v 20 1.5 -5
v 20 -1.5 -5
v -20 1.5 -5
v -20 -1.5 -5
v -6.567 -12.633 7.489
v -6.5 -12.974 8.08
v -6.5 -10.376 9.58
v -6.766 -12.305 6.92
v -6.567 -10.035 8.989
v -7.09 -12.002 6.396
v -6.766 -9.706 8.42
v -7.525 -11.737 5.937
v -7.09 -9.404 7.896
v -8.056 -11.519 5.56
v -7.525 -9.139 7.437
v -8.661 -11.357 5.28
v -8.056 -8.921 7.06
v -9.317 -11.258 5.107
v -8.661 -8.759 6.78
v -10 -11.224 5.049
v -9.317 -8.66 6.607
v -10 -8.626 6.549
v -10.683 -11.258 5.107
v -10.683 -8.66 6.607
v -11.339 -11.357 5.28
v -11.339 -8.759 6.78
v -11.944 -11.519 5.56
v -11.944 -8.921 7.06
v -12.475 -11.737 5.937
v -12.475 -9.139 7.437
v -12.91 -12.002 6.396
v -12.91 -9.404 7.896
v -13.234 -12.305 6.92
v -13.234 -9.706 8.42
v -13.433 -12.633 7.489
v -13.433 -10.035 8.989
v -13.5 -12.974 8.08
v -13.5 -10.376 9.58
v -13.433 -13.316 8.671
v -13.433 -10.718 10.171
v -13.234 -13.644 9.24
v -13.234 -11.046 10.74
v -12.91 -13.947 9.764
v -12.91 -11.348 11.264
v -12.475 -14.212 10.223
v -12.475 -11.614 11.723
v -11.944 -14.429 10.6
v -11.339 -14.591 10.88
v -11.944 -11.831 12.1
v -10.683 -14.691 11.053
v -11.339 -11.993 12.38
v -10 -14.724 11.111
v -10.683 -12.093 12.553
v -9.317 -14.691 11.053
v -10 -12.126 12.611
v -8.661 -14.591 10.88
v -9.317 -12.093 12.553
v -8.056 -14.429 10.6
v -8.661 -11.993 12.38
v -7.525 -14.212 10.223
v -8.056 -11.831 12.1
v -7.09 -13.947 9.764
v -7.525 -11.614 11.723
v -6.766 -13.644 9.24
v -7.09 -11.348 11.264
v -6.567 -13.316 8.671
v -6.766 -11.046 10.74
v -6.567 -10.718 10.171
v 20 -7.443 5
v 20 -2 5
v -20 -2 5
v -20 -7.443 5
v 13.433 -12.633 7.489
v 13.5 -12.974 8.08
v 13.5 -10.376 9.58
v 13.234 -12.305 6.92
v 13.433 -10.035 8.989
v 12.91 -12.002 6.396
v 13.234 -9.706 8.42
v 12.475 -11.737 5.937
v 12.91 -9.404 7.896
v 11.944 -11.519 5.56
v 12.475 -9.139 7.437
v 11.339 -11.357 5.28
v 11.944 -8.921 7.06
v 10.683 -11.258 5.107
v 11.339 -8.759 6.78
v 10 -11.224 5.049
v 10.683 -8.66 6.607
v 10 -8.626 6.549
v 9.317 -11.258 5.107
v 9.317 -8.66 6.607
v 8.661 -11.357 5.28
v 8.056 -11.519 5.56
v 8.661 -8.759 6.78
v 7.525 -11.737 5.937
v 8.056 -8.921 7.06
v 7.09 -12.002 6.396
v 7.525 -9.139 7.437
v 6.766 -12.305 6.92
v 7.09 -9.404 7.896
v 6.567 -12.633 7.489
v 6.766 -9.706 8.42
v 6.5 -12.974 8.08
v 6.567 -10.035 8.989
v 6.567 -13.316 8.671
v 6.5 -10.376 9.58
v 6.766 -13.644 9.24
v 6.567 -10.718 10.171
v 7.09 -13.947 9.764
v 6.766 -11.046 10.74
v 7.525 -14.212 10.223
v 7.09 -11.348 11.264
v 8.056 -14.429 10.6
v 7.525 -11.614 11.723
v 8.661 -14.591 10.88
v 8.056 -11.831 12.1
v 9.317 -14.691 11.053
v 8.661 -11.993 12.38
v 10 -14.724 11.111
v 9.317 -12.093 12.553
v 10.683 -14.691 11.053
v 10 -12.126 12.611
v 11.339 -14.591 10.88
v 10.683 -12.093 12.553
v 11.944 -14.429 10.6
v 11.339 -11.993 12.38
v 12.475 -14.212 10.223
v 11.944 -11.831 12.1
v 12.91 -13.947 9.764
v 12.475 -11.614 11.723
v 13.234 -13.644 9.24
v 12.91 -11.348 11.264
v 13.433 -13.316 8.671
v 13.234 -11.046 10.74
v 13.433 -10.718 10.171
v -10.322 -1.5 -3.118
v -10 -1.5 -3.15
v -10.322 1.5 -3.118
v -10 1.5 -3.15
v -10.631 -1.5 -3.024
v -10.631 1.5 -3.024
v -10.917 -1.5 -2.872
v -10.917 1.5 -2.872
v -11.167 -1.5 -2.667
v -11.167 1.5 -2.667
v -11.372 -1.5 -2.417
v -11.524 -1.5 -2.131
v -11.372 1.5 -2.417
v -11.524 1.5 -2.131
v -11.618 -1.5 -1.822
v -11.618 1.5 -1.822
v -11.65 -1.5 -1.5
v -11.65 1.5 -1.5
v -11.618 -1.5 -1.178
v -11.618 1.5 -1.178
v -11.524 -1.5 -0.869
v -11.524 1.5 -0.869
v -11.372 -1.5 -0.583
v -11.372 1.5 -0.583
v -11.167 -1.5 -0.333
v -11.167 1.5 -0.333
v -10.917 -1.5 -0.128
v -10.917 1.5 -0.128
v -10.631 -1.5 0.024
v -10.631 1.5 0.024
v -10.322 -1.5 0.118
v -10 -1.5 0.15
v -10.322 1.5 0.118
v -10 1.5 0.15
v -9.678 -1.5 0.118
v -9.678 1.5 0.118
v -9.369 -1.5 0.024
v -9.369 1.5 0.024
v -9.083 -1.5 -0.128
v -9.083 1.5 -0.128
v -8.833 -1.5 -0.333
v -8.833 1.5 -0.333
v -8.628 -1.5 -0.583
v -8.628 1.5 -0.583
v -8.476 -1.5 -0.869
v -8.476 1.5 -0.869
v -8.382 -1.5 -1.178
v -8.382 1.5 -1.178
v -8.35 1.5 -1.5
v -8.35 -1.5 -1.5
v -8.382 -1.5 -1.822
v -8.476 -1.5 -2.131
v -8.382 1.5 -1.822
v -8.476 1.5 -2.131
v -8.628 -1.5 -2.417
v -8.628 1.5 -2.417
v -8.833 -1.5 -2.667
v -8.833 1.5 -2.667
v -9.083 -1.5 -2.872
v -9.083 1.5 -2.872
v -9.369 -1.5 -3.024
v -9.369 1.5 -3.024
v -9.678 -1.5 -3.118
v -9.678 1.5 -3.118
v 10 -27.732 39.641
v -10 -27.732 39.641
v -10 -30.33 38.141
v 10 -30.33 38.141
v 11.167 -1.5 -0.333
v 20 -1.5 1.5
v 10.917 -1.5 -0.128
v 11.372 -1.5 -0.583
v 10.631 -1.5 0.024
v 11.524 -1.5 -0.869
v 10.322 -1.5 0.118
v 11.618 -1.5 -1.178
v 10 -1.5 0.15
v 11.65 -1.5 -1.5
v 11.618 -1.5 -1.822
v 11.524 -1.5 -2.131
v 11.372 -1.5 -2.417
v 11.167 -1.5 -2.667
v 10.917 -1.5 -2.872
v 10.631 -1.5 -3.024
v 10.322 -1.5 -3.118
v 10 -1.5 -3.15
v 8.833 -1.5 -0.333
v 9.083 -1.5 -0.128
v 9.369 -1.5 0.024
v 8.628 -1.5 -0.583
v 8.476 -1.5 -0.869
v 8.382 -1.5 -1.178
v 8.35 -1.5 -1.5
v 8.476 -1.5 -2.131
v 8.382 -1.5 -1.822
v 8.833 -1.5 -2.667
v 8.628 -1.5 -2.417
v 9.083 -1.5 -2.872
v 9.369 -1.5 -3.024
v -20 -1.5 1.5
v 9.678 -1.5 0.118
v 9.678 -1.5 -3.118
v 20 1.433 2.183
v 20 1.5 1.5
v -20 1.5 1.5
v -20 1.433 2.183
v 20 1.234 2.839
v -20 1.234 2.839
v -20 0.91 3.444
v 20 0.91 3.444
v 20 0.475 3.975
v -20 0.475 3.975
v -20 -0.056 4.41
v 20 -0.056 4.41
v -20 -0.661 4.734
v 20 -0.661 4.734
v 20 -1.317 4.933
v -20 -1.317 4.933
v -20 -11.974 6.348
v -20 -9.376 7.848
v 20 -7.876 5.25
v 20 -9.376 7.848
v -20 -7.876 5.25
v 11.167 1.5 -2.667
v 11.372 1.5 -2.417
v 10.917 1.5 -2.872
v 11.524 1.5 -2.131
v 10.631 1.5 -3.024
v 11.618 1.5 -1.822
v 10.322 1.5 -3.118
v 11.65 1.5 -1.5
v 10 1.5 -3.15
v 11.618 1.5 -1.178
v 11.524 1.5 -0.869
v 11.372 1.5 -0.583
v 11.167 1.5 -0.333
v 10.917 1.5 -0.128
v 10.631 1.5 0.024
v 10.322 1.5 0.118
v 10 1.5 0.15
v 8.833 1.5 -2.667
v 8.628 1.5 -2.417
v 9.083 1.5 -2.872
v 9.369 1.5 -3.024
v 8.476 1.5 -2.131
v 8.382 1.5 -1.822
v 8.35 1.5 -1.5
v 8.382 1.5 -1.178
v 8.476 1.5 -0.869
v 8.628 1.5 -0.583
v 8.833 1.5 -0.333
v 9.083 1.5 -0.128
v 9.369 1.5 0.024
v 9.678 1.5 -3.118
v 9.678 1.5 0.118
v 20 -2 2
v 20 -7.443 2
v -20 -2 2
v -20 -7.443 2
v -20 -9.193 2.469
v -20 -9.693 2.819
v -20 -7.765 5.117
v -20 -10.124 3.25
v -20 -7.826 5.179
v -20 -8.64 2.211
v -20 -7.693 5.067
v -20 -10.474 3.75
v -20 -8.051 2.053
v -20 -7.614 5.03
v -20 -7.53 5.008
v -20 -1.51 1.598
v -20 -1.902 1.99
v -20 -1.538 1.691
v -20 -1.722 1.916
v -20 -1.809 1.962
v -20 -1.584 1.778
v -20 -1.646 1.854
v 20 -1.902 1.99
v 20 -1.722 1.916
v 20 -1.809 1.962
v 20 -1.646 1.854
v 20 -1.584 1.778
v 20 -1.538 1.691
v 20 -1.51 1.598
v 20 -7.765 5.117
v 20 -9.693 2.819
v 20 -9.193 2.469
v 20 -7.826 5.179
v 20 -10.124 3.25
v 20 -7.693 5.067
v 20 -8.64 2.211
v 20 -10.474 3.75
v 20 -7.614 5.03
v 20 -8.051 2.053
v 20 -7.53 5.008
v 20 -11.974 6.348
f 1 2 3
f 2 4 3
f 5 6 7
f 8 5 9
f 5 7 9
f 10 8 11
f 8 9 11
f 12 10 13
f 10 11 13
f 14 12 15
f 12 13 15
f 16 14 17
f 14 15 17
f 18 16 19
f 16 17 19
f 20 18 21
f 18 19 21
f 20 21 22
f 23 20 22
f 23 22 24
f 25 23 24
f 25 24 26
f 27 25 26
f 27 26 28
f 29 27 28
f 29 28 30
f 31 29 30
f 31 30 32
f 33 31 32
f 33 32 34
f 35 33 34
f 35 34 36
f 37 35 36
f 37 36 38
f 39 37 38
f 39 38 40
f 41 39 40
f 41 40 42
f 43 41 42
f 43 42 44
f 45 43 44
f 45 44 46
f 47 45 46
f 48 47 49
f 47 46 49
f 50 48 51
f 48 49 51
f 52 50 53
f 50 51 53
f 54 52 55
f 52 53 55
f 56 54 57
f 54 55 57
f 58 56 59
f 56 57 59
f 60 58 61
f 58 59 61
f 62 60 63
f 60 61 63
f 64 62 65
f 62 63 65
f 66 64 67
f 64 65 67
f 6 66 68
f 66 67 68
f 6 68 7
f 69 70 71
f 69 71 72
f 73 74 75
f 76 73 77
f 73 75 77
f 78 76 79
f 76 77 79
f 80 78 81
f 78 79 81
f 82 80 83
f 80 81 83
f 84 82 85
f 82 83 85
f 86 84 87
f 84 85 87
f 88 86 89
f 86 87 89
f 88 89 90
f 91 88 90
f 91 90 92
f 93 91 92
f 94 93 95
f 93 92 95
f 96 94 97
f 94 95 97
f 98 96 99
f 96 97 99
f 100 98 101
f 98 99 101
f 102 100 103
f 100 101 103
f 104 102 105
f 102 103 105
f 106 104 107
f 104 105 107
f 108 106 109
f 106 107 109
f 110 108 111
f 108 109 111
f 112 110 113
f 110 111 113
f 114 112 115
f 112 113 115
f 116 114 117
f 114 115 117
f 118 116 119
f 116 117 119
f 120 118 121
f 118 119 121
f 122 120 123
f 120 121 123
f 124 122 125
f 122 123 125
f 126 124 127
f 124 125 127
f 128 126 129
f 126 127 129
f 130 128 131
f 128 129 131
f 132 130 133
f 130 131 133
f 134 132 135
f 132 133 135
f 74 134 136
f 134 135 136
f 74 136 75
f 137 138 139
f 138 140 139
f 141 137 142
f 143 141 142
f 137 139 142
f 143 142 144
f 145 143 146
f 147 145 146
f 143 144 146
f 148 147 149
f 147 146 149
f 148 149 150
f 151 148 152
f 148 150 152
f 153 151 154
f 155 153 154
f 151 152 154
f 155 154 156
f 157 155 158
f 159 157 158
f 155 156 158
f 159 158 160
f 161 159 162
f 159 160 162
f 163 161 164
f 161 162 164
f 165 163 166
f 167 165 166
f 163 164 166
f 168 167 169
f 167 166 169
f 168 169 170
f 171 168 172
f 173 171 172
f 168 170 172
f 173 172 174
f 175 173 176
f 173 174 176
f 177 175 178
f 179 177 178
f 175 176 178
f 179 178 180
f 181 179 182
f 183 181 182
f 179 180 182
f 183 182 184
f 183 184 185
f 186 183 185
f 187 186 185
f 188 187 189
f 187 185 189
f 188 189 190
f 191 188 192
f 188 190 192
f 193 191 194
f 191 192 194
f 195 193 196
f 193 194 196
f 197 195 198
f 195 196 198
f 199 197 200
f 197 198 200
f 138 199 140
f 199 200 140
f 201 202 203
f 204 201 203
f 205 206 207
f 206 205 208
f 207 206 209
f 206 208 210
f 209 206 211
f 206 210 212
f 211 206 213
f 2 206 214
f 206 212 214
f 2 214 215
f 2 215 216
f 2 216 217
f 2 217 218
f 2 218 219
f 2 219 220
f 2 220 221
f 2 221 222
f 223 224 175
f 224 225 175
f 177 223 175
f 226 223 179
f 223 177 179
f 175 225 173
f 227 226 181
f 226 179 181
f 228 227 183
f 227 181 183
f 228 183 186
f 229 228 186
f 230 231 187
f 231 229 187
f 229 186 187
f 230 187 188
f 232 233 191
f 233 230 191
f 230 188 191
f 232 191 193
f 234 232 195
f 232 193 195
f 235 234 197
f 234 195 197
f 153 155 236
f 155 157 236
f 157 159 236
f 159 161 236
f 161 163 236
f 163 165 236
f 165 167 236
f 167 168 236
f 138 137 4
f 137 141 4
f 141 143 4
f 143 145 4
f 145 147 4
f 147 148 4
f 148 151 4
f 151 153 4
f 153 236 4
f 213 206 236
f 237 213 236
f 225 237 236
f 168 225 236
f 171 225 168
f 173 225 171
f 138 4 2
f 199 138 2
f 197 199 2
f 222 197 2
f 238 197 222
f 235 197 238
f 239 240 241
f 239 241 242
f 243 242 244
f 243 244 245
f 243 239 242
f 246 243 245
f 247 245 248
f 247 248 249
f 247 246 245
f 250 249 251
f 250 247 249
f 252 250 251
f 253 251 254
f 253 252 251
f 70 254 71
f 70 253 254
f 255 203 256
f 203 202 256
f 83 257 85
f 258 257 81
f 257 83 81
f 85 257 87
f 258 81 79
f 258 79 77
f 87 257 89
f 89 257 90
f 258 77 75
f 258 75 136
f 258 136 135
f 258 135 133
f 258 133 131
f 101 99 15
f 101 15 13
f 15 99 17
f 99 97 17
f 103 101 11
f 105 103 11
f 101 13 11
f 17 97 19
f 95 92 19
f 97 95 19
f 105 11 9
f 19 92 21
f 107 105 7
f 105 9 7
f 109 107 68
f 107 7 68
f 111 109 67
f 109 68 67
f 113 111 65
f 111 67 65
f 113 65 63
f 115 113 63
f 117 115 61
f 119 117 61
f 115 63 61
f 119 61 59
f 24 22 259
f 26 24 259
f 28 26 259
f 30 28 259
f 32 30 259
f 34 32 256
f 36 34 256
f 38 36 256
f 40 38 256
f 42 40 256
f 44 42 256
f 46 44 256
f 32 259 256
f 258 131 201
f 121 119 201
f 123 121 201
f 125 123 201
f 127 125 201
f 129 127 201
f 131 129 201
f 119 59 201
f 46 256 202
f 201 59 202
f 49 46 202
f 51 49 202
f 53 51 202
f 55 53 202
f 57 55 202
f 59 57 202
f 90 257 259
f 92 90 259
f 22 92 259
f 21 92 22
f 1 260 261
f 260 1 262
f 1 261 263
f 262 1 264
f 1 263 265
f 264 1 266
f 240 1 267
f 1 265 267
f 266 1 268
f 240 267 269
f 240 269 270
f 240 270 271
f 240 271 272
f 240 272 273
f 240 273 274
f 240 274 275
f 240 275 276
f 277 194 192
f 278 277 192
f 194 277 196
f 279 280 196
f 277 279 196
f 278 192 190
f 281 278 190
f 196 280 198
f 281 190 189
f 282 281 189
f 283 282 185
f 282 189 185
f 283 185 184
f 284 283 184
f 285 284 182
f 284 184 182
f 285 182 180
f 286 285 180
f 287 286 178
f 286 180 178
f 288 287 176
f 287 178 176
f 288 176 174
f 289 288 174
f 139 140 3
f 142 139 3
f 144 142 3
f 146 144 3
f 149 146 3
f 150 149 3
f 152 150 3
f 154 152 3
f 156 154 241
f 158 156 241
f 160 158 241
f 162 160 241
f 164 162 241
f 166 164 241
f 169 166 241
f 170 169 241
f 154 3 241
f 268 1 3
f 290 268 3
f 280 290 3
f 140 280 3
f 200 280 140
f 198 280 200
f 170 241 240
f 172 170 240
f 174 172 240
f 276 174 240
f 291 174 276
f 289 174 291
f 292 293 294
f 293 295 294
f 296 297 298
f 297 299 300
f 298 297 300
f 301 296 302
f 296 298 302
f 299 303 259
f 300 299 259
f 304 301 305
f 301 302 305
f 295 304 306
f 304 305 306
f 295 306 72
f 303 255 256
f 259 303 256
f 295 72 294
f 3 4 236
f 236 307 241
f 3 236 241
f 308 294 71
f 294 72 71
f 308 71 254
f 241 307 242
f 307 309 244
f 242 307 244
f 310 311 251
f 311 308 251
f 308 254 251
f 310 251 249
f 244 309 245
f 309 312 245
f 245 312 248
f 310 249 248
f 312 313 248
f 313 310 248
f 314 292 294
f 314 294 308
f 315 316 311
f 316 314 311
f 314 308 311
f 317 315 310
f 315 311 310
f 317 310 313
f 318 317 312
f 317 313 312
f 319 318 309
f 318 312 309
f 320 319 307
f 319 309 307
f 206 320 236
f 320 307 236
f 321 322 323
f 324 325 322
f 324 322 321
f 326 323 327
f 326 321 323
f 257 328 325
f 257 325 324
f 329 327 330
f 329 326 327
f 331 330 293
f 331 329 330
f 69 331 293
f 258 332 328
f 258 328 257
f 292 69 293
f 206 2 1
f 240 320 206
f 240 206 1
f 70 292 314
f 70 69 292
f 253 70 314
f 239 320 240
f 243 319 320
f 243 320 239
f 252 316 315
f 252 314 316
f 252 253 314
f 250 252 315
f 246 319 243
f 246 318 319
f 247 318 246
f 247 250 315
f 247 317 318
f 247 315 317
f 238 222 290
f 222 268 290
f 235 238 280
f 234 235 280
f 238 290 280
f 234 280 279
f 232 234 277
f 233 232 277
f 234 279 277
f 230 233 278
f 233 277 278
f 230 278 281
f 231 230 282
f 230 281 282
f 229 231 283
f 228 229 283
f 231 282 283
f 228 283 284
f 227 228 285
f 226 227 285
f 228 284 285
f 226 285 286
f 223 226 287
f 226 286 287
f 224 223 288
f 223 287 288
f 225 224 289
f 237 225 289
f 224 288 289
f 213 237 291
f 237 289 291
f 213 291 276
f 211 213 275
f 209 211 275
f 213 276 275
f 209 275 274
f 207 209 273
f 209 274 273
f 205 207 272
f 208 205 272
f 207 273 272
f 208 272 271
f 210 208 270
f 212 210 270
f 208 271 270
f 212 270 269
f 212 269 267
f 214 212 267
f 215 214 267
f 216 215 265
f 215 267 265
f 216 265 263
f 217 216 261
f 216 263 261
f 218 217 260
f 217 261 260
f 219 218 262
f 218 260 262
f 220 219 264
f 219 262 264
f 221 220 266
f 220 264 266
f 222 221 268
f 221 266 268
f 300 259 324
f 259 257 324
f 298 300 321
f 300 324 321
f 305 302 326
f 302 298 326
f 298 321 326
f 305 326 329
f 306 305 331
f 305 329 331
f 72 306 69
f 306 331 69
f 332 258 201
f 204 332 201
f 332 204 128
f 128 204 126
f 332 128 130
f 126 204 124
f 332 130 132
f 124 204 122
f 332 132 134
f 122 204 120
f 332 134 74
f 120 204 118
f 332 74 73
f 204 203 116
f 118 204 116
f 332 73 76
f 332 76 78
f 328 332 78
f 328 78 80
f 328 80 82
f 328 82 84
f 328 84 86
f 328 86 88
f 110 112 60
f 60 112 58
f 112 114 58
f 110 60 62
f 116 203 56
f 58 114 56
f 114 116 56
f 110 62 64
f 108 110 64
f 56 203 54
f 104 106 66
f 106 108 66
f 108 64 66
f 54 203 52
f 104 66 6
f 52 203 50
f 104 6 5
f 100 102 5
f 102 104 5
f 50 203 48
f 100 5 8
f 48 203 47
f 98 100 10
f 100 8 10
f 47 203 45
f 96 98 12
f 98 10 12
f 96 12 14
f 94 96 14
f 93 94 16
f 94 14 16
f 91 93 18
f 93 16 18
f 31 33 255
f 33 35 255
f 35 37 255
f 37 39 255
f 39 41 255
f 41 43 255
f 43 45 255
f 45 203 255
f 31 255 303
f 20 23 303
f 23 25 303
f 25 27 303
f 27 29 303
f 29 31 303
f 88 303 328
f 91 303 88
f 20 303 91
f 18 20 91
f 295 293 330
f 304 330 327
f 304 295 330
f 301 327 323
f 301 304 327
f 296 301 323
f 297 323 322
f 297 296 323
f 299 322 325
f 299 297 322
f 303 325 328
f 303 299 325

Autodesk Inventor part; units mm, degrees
ref_plane "YZ Plane" through (0, 0, 0) normal (1, 0, 0) x (0, 1, 0)
ref_plane "XZ Plane" through (0, 0, 0) normal (0, 1, 0) x (-1, 0, 0)
ref_plane "XY Plane" through (0, 0, 0) normal (0, 0, 1) x (1, 0, 0)
sketch "Sketch1" plane through (0, 0, 0) normal (1, 0, 0) x (0, 1, 0)
  line L0 (1.5, -5) -> (1.5, 5)
  line L1 (1.5, 5) -> (-7.7318, 5)
  line L2 (-9.4639, 2) -> (-1.5, 2)
  line L3 (-1.5, 2) -> (-1.5, -5)
  line L4 (-1.5, -5) -> (1.5, -5)
  line L5 (-7.7318, 5) -> (-27.7318, 39.641)
  line L6 (-27.7318, 39.641) -> (-30.3299, 38.141)
  line L7 (-30.3299, 38.141) -> (-9.4639, 2)
  point P0 (0, 0)
  point P1 (0, -5)
  point P2 (1.5, 0)
  dimension "d0" = 3
  dimension "d1" = 10
  dimension "d2" = 150
  dimension "d3" = 3
  dimension "d4" = 3
  dimension "d5" = 40
  dimension "d6" = 7.995
extrude "Extrusion1" add sketch "Sketch1" along normal mid plane 40
fillet "Fillet1" radius 3.5 2 edges at (0, 1.5, 5) (0, -9.4639, 2)
fillet "Fillet1" radius 0.5 2 edges at (0, -1.5, 2) (0, -7.7318, 5)
sketch "Sketch2" plane through (-20, -1.5, -5) normal (0, -1, 0) x (1, 0, 0)
  line L0 (30, 3.5) -> (10, 3.5) construction
  line L1 (0, 0) -> (40, 0) construction
  point P0 (20, 5)
  point P1 (20, 3.5)
  dimension "d11" = 20
  dimension "d12" = 3.5
hole "Hole1" at (10, -1.5, -1.5) at (-10, -1.5, -1.5) direction (0, 1, 0) diameter 3.3 end through all
sketch "Sketch3" plane through (-20, -27.7318, 39.641) normal (0, 0.8660254, 0.5) x (1, 0, 0)
  line L0 (0, 39.7113) -> (40, 39.7113) projected
  line L1 (0, 0) -> (0, 39.7113) projected
  line L2 (0, 0) -> (40, 0) projected
  line L3 (40, 39.7113) -> (40, 0) projected
  line L4 (0, 0) -> (40, 0) projected
  line L5 (10, 0) -> (0, 36.7113)
  line L6 (0, 39.7113) -> (0, 0) projected
  line L7 (40, 36.7113) -> (30, 0)
  circle A0 centre (10, 34.7113) radius 3.5
  circle A1 centre (30, 34.7113) radius 3.5
  line L8 (10, 34.7113) -> (30, 34.7113) construction
  point P0 (20, 48.196)
  point P1 (20, 34.7113)
  point P2 (20, 0)
  dimension "d20" = 7
  dimension "d21" = 20
  dimension "d22" = 3
  dimension "d23" = 20
  dimension "d24" = 5
extrude "Extrusion2" cut sketch "Sketch3" against normal through all contours L5 L2 L1 | L3 L2 L7 | A0 | A1
equation "\"d3\" = d0"
equation "\"d4\" = d0"
properties part number "P-POD_DoorStop" material "Aluminum 6061"
